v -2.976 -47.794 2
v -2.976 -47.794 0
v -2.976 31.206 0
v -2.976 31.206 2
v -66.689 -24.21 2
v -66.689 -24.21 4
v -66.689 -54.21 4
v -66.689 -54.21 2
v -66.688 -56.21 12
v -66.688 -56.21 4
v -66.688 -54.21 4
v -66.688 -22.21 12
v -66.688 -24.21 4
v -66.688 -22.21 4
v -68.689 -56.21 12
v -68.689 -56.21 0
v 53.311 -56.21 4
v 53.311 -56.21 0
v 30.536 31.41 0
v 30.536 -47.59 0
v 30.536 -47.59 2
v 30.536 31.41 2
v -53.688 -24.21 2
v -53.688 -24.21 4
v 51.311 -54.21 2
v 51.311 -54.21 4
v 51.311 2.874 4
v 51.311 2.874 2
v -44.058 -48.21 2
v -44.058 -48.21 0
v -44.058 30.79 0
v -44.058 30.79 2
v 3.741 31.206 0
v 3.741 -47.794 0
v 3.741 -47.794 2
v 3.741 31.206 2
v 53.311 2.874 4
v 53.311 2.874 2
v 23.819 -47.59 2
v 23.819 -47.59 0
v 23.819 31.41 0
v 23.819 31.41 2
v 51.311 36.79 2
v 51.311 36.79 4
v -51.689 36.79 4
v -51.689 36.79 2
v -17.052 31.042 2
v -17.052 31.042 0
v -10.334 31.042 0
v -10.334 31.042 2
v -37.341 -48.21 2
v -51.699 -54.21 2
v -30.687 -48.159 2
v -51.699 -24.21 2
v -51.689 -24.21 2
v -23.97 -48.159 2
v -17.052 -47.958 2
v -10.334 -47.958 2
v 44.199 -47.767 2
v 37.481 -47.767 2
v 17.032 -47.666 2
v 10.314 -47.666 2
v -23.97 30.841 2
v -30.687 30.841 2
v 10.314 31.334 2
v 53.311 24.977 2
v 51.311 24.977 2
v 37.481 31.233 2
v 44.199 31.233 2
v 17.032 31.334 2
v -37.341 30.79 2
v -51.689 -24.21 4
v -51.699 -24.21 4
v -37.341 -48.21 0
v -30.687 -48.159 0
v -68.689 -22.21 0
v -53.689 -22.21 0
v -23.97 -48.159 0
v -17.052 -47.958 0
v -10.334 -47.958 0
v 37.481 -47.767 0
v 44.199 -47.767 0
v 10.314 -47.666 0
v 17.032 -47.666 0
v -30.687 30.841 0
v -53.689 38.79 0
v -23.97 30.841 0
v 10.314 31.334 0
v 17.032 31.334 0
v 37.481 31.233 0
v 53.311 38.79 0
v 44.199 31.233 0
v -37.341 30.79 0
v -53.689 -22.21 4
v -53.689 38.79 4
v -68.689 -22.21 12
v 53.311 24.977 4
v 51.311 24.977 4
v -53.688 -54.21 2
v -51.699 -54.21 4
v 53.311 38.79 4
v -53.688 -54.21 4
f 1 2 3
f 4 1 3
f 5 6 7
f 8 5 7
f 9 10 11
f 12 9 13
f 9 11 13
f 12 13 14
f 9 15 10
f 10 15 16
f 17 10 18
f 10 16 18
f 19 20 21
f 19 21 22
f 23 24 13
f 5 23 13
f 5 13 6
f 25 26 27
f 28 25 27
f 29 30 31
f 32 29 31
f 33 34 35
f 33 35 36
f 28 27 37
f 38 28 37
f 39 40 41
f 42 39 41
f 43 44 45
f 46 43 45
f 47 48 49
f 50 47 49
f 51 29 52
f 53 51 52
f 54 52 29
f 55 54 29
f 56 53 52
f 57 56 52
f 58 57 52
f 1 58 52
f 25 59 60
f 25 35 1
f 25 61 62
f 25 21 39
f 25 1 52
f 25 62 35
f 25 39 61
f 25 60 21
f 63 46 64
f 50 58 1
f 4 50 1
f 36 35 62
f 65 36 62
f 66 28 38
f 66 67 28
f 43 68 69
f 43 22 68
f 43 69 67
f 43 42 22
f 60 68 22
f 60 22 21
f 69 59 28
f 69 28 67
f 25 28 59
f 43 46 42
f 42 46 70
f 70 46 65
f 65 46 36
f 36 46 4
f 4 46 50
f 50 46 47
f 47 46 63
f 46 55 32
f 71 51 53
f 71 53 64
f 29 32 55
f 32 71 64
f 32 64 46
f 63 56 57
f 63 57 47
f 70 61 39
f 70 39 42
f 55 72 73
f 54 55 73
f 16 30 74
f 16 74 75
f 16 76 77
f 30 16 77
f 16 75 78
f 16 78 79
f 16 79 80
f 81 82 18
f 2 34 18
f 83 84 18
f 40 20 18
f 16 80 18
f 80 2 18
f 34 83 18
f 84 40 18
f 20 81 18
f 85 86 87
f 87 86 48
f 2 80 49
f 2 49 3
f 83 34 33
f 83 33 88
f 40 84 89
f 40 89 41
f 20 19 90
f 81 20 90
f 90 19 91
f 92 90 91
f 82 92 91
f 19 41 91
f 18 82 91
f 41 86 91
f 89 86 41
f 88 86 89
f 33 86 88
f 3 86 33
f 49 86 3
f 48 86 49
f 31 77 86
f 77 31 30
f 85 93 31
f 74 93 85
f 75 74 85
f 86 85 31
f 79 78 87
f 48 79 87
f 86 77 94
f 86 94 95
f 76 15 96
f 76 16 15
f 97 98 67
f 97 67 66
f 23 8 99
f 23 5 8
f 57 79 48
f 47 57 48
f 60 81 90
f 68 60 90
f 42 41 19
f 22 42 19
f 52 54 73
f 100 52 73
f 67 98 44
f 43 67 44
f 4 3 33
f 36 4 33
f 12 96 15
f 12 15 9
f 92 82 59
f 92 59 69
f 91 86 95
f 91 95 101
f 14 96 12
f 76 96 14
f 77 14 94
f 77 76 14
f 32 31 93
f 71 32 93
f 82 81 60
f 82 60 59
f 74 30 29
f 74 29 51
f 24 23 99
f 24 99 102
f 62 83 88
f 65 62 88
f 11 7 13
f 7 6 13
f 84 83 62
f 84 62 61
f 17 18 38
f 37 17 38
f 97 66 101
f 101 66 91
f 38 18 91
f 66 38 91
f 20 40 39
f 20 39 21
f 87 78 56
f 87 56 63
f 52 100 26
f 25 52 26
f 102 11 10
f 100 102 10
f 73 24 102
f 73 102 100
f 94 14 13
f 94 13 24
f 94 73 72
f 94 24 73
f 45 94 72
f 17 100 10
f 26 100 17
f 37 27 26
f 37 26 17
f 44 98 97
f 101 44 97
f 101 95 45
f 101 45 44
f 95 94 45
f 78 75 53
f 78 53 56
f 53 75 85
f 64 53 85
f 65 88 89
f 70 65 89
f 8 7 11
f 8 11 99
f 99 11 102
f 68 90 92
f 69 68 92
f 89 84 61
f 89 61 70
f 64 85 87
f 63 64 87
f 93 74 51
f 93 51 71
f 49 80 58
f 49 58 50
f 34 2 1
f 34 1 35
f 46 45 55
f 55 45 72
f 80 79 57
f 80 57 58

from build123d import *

# Parameters (mm, degrees)
SKETCH1_W           = 107
SKETCH1_H           = 95
SKETCH1_W_2         = 6.717391304
SKETCH1_H_2         = 79
SKETCH1_W_3         = 6.717391305
SKETCH1_W_4         = 15
SKETCH1_H_3         = 34
BOSS_EXTRUDE1_DEPTH = 4
CUT_EXTRUDE1_DEPTH  = 2
SKETCH5_W           = 2.000809174
SKETCH5_H           = 34
BOSS_EXTRUDE3_DEPTH = 8
SKETCH6_W           = 2
SKETCH6_H           = 22.102752069
CUT_EXTRUDE2_DEPTH  = 2
SKETCH7_W           = 1.989121342
SKETCH7_H           = 2
BOSS_EXTRUDE4_DEPTH = 30


with BuildPart() as part:
    # Sketch1 → Boss-Extrude1 (new body)
    # profile 1 of 2: a face of its own
    with BuildSketch(Plane.XY):
        with Locations((-0.188618926, -8.710358056)):
            Rectangle(SKETCH1_W, SKETCH1_H)
        with Locations((-40.699488491, -8.710358056)):
            Rectangle(SKETCH1_W_2, SKETCH1_H_2, mode=Mode.SUBTRACT)
        with Locations((-27.328779255, -8.658557904)):
            Rectangle(SKETCH1_W_2, SKETCH1_H_2, mode=Mode.SUBTRACT)
        with Locations((-13.692855398, -8.457629635)):
            Rectangle(SKETCH1_W_2, SKETCH1_H_2, mode=Mode.SUBTRACT)
        with Locations((0.382489646, -8.294414238)):
            Rectangle(SKETCH1_W_3, SKETCH1_H_2, mode=Mode.SUBTRACT)
        with Locations((13.672826098, -8.166203861)):
            Rectangle(SKETCH1_W_2, SKETCH1_H_2, mode=Mode.SUBTRACT)
        with Locations((27.177523355, -8.09026595)):
            Rectangle(SKETCH1_W_2, SKETCH1_H_2, mode=Mode.SUBTRACT)
        with Locations((40.840153453, -8.266624041)):
            Rectangle(SKETCH1_W_2, SKETCH1_H_2, mode=Mode.SUBTRACT)
    # profile 2 of 2: a face of its own
    with BuildSketch(Plane.XY):
        with Locations((-61.188618926, -39.210358056)):
            Rectangle(SKETCH1_W_4, SKETCH1_H_3)
    extrude(amount=BOSS_EXTRUDE1_DEPTH)

    # Sketch3 → Cut-Extrude1 (cut)
    with BuildSketch(Plane.XY.offset(4)):
        Polygon((51.311381074, -54.210358056), (51.311381074, 36.789641944), (-51.688618926, 36.789641944), (-51.688618926, -24.210358056), (-66.688618926, -24.210358056), (-66.688618926, -54.210358056), align=None)
    extrude(amount=-CUT_EXTRUDE1_DEPTH, mode=Mode.SUBTRACT)

    # Sketch5 → Boss-Extrude3 (add)
    with BuildSketch(Plane.XY.offset(4)):
        with Locations((-67.688214339, -39.210358056)):
            Rectangle(SKETCH5_W, SKETCH5_H)
    extrude(amount=BOSS_EXTRUDE3_DEPTH)

    # Sketch6 → Cut-Extrude2 (cut)
    with BuildSketch(Plane.XY.offset(4)):
        with Locations((52.311381074, 13.925496341)):
            Rectangle(SKETCH6_W, SKETCH6_H)
    extrude(amount=-CUT_EXTRUDE2_DEPTH, mode=Mode.SUBTRACT)

    # Sketch7 → Boss-Extrude4 (add)
    with BuildSketch(Plane.XZ.offset(24.210358056)):
        with Locations((-52.693548431, 3)):
            Rectangle(SKETCH7_W, SKETCH7_H)
    extrude(amount=BOSS_EXTRUDE4_DEPTH)


solid = part.part
